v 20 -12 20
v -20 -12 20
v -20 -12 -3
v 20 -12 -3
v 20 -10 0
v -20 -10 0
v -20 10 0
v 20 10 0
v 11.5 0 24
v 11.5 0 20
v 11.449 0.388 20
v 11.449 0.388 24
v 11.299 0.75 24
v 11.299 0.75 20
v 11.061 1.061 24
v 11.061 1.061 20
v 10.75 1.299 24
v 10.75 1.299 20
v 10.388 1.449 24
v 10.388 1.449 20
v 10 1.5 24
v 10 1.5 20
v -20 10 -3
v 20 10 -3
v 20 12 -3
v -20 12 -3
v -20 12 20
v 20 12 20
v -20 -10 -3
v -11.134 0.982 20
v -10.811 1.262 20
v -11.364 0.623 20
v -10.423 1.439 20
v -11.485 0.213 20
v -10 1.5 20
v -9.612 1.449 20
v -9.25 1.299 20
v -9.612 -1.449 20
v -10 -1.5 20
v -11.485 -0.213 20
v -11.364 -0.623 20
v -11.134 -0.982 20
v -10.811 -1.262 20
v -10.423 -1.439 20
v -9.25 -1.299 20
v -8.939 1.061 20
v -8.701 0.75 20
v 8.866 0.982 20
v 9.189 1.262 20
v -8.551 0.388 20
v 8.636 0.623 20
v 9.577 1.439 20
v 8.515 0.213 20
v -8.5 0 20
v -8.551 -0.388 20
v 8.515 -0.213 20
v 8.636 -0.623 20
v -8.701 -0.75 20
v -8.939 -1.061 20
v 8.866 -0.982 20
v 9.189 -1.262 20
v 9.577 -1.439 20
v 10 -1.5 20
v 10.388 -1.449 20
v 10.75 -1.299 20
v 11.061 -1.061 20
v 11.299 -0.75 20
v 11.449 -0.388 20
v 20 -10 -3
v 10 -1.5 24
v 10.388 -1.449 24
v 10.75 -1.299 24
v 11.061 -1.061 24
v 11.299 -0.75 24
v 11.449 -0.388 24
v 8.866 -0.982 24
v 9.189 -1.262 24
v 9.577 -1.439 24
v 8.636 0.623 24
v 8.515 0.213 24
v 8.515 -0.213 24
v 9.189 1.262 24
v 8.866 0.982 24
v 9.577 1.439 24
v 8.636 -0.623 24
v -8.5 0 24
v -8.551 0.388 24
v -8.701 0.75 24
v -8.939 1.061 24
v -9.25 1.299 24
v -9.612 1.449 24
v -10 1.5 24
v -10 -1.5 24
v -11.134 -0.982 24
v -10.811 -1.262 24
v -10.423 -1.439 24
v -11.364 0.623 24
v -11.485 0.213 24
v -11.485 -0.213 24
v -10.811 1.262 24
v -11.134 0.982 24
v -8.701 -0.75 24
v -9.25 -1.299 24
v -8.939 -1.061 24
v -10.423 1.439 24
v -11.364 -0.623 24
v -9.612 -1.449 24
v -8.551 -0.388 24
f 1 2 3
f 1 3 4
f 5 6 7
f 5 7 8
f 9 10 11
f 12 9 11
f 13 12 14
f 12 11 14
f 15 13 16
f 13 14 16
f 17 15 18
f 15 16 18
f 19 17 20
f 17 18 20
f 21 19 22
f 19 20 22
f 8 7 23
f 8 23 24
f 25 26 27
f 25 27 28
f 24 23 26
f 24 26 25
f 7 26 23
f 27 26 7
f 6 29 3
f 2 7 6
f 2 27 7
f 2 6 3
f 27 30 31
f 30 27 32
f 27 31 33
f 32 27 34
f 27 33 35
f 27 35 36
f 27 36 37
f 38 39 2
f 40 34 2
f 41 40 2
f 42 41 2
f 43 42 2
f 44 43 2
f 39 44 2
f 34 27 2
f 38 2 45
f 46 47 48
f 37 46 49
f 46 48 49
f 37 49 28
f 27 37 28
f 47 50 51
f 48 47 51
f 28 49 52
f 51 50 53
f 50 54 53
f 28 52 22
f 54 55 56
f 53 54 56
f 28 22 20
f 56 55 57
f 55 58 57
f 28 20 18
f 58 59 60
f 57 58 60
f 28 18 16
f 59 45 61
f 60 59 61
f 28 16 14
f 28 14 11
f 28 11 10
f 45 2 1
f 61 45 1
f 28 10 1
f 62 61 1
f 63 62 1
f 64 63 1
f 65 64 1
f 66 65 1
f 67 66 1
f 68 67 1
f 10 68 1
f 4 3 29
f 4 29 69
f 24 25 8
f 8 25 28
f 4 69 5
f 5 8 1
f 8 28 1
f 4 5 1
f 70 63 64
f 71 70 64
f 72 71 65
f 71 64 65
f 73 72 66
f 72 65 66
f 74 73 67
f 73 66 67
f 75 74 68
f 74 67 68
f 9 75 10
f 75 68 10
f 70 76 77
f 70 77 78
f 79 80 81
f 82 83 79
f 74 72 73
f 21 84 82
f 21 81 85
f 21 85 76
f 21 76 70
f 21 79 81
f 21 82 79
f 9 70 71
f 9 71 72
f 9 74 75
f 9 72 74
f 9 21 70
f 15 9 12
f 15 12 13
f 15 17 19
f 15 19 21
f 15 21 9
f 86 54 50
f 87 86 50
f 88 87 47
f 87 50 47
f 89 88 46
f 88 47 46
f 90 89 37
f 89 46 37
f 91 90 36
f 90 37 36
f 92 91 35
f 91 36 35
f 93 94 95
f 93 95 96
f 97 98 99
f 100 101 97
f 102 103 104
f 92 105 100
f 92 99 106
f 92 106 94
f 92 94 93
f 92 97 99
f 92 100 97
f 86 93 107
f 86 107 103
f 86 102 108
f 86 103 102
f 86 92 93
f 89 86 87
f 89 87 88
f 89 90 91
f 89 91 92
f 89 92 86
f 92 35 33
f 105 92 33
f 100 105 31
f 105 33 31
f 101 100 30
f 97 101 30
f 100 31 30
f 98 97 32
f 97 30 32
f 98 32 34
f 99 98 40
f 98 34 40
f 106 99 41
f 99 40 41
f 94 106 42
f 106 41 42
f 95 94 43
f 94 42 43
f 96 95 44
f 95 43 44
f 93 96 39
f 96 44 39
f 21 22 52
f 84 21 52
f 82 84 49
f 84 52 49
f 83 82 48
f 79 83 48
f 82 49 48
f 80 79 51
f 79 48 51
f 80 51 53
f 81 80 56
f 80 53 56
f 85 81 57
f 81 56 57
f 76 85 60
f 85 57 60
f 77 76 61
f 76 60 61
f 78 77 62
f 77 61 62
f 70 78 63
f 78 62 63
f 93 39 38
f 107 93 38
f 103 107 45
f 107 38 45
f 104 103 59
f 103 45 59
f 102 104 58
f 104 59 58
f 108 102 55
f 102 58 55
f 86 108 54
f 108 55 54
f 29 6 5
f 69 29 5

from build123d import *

# Parameters (mm, degrees)
F0_W     = 40
F0_H     = 20
F1_DEPTH = 20
F3_DEPTH = 4
F4_DEPTH = 2
F5_DEPTH = 2
F6_W     = 40
F6_H     = 2
F7_DEPTH = 3


with BuildPart() as f1:
    # F0 (on Top) → F1 (new body)
    with BuildSketch(Plane.XY):
        Rectangle(F0_W, F0_H)
    extrude(amount=F1_DEPTH)

    # F2 (on face) → F3 (join)
    with BuildSketch(Plane.XY.offset(20)):
        with BuildLine():
            Line((-10, -1.5), (-10, 1.5))
            ThreePointArc((-10, 1.5), (-11.5, 0), (-10, -1.5))
        make_face()
        with BuildLine():
            ThreePointArc((-8.5, 0), (-8.9393398282, 1.0606601718), (-10, 1.5))
            Line((-10, 1.5), (-10, -1.5))
            ThreePointArc((-10, -1.5), (-8.9393398282, -1.0606601718), (-8.5, 0))
        make_face()
        with BuildLine():
            Line((10, -1.5), (10, 1.5))
            ThreePointArc((10, 1.5), (8.5, 0), (10, -1.5))
        make_face()
        with BuildLine():
            ThreePointArc((11.5, 0), (11.0606601718, 1.0606601718), (10, 1.5))
            Line((10, 1.5), (10, -1.5))
            ThreePointArc((10, -1.5), (11.0606601718, -1.0606601718), (11.5, 0))
        make_face()
    extrude(amount=F3_DEPTH)

    # F4 (add): a face of the model
    f4_faces = [f1.faces().sort_by_distance(p)[0] for p in [
        (0, -10, 10),
    ]]
    extrude(f4_faces, amount=F4_DEPTH)

    # F5 (add): a face of the model
    f5_faces = [f1.faces().sort_by_distance(p)[0] for p in [
        (0, 10, 10),
    ]]
    extrude(f5_faces, amount=F5_DEPTH)

    # F6 (on face) → F7 (join)
    with BuildSketch(Plane(origin=(0, 0, 0), x_dir=(1, 0, 0), z_dir=(0, 0, -1))):
        with Locations((0, 11)):
            Rectangle(F6_W, F6_H)
        with Locations((0, -11)):
            Rectangle(F6_W, F6_H)
    extrude(amount=F7_DEPTH)


solid = f1.part
